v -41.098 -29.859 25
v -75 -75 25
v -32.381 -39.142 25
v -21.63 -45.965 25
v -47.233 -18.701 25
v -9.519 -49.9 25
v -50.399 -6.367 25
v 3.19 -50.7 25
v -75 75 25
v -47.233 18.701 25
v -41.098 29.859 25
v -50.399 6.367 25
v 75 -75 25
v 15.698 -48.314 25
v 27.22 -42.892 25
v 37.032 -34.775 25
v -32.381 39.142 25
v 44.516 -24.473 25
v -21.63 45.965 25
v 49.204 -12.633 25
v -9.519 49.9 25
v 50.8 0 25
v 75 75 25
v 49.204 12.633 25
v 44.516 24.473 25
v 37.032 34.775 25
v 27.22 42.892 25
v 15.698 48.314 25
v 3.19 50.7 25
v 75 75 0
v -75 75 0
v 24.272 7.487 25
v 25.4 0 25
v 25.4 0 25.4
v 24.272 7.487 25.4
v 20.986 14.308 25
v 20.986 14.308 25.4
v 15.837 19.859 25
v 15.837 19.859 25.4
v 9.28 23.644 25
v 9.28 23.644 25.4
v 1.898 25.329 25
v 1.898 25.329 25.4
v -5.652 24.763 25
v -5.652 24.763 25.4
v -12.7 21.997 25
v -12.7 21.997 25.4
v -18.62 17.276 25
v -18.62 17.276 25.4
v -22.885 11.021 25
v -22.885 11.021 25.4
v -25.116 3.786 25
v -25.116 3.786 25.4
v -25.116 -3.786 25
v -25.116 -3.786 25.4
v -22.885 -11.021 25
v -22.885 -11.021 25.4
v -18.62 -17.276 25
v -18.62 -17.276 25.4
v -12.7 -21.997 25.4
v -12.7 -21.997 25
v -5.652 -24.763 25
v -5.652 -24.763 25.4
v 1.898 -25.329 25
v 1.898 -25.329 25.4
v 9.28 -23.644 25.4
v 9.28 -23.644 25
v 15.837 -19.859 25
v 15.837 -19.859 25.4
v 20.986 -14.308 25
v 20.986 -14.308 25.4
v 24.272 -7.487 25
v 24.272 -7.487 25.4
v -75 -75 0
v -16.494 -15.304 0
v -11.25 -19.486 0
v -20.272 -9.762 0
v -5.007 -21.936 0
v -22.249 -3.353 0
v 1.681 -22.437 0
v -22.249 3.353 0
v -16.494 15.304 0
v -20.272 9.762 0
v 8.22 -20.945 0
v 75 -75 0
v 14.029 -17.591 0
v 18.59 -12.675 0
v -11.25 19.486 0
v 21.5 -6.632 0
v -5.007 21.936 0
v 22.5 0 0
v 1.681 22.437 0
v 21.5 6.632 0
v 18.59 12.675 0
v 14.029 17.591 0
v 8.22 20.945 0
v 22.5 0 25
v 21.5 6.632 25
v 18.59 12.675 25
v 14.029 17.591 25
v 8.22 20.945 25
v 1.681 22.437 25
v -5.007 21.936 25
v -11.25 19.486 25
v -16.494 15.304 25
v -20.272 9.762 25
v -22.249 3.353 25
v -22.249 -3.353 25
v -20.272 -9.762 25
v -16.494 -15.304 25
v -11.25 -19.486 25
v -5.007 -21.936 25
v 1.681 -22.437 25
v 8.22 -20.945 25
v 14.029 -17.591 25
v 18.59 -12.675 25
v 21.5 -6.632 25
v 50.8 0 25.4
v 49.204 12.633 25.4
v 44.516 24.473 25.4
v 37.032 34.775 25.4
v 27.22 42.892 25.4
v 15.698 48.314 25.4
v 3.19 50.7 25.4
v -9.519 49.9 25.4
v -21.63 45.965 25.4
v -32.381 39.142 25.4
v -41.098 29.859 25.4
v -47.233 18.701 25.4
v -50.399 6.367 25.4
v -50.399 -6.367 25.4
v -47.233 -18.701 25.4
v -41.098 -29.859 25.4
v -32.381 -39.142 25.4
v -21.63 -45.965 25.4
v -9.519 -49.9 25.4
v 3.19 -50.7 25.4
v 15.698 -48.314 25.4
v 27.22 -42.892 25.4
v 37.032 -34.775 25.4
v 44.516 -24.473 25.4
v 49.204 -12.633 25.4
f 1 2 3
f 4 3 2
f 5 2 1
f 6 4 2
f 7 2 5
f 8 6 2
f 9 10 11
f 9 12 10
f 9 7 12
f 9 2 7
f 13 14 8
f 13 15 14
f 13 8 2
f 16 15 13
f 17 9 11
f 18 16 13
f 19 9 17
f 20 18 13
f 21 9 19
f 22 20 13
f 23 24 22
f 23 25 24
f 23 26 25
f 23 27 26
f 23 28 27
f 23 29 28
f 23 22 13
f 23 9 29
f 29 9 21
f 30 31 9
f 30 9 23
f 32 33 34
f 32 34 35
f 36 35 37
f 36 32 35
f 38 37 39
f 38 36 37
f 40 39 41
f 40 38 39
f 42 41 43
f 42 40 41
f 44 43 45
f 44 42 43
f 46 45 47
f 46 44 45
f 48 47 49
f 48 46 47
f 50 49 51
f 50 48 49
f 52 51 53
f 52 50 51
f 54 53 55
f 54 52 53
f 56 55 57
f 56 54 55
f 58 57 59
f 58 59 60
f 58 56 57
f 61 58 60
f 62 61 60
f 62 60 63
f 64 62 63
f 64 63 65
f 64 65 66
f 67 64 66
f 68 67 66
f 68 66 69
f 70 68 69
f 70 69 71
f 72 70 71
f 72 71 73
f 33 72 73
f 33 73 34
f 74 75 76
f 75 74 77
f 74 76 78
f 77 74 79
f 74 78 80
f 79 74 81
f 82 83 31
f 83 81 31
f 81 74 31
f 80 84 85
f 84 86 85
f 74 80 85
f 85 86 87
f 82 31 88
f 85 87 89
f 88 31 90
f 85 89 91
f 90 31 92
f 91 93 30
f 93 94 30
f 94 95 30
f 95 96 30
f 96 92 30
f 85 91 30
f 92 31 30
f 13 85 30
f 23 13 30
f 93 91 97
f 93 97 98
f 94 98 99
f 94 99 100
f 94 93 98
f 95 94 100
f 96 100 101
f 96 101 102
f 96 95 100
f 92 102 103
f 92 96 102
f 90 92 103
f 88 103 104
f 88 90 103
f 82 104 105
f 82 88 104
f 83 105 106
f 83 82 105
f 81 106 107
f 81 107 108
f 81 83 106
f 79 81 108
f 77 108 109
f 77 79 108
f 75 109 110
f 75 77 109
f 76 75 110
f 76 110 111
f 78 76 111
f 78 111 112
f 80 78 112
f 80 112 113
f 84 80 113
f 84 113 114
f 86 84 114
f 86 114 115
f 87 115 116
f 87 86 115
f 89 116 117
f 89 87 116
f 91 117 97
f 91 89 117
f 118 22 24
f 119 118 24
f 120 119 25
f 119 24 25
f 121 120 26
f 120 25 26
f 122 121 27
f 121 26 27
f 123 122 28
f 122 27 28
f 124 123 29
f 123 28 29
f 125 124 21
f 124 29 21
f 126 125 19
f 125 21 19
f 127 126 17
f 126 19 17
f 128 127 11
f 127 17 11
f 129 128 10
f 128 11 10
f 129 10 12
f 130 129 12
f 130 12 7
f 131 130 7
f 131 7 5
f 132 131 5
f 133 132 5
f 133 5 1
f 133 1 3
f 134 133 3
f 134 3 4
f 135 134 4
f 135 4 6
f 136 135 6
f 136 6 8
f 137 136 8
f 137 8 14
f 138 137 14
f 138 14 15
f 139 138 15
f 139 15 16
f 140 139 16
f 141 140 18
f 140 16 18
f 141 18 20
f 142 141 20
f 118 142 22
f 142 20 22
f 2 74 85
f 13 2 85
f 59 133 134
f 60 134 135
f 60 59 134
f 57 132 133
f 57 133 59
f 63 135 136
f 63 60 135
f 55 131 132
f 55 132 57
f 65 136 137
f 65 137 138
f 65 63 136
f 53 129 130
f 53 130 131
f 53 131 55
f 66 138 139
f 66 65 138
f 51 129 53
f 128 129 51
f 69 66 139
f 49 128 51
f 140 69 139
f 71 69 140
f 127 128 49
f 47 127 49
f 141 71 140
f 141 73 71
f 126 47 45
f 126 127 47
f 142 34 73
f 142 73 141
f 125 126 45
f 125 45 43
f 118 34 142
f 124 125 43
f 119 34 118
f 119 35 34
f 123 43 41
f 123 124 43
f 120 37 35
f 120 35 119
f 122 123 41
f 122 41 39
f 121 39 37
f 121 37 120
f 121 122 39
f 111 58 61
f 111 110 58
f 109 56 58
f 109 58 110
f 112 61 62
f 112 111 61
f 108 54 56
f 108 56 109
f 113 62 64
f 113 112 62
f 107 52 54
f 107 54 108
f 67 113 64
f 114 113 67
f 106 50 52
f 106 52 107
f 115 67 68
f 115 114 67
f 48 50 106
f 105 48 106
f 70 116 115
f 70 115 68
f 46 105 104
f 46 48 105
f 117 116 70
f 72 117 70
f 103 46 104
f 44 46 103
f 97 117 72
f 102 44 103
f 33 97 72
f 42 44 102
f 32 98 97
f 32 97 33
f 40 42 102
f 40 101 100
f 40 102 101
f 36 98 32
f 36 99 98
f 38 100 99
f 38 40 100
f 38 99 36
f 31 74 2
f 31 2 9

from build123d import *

# Parameters (mm, degrees)
F0_R     = 50.8
F0_R_2   = 25.4
F1_DEPTH = 25.4
F2_W     = 150
F2_H     = 150
F2_R     = 50.8
F3_DEPTH = 25
F4_R     = 25.4
F4_R_2   = 22.5
F5_DEPTH = 25


# Not quite as in the source:
# - the program builds the solid bodies; features that only make, move or delete a surface that nothing else refers to are left out


with BuildPart() as f1:
    # F0 (on Top) → F1 (new body)
    with BuildSketch(Plane.XY):
        Circle(F0_R)
        Circle(F0_R_2, mode=Mode.SUBTRACT)
    extrude(amount=F1_DEPTH)

    # F2 (on Top) → F3 (join)
    with BuildSketch(Plane.XY):
        Rectangle(F2_W, F2_H)
        Circle(F2_R, mode=Mode.SUBTRACT)
    extrude(amount=F3_DEPTH)

    # F4 (on Top) → F5 (join)
    with BuildSketch(Plane.XY):
        Circle(F4_R)
        Circle(F4_R_2, mode=Mode.SUBTRACT)
    extrude(amount=F5_DEPTH)


solid = f1.part
